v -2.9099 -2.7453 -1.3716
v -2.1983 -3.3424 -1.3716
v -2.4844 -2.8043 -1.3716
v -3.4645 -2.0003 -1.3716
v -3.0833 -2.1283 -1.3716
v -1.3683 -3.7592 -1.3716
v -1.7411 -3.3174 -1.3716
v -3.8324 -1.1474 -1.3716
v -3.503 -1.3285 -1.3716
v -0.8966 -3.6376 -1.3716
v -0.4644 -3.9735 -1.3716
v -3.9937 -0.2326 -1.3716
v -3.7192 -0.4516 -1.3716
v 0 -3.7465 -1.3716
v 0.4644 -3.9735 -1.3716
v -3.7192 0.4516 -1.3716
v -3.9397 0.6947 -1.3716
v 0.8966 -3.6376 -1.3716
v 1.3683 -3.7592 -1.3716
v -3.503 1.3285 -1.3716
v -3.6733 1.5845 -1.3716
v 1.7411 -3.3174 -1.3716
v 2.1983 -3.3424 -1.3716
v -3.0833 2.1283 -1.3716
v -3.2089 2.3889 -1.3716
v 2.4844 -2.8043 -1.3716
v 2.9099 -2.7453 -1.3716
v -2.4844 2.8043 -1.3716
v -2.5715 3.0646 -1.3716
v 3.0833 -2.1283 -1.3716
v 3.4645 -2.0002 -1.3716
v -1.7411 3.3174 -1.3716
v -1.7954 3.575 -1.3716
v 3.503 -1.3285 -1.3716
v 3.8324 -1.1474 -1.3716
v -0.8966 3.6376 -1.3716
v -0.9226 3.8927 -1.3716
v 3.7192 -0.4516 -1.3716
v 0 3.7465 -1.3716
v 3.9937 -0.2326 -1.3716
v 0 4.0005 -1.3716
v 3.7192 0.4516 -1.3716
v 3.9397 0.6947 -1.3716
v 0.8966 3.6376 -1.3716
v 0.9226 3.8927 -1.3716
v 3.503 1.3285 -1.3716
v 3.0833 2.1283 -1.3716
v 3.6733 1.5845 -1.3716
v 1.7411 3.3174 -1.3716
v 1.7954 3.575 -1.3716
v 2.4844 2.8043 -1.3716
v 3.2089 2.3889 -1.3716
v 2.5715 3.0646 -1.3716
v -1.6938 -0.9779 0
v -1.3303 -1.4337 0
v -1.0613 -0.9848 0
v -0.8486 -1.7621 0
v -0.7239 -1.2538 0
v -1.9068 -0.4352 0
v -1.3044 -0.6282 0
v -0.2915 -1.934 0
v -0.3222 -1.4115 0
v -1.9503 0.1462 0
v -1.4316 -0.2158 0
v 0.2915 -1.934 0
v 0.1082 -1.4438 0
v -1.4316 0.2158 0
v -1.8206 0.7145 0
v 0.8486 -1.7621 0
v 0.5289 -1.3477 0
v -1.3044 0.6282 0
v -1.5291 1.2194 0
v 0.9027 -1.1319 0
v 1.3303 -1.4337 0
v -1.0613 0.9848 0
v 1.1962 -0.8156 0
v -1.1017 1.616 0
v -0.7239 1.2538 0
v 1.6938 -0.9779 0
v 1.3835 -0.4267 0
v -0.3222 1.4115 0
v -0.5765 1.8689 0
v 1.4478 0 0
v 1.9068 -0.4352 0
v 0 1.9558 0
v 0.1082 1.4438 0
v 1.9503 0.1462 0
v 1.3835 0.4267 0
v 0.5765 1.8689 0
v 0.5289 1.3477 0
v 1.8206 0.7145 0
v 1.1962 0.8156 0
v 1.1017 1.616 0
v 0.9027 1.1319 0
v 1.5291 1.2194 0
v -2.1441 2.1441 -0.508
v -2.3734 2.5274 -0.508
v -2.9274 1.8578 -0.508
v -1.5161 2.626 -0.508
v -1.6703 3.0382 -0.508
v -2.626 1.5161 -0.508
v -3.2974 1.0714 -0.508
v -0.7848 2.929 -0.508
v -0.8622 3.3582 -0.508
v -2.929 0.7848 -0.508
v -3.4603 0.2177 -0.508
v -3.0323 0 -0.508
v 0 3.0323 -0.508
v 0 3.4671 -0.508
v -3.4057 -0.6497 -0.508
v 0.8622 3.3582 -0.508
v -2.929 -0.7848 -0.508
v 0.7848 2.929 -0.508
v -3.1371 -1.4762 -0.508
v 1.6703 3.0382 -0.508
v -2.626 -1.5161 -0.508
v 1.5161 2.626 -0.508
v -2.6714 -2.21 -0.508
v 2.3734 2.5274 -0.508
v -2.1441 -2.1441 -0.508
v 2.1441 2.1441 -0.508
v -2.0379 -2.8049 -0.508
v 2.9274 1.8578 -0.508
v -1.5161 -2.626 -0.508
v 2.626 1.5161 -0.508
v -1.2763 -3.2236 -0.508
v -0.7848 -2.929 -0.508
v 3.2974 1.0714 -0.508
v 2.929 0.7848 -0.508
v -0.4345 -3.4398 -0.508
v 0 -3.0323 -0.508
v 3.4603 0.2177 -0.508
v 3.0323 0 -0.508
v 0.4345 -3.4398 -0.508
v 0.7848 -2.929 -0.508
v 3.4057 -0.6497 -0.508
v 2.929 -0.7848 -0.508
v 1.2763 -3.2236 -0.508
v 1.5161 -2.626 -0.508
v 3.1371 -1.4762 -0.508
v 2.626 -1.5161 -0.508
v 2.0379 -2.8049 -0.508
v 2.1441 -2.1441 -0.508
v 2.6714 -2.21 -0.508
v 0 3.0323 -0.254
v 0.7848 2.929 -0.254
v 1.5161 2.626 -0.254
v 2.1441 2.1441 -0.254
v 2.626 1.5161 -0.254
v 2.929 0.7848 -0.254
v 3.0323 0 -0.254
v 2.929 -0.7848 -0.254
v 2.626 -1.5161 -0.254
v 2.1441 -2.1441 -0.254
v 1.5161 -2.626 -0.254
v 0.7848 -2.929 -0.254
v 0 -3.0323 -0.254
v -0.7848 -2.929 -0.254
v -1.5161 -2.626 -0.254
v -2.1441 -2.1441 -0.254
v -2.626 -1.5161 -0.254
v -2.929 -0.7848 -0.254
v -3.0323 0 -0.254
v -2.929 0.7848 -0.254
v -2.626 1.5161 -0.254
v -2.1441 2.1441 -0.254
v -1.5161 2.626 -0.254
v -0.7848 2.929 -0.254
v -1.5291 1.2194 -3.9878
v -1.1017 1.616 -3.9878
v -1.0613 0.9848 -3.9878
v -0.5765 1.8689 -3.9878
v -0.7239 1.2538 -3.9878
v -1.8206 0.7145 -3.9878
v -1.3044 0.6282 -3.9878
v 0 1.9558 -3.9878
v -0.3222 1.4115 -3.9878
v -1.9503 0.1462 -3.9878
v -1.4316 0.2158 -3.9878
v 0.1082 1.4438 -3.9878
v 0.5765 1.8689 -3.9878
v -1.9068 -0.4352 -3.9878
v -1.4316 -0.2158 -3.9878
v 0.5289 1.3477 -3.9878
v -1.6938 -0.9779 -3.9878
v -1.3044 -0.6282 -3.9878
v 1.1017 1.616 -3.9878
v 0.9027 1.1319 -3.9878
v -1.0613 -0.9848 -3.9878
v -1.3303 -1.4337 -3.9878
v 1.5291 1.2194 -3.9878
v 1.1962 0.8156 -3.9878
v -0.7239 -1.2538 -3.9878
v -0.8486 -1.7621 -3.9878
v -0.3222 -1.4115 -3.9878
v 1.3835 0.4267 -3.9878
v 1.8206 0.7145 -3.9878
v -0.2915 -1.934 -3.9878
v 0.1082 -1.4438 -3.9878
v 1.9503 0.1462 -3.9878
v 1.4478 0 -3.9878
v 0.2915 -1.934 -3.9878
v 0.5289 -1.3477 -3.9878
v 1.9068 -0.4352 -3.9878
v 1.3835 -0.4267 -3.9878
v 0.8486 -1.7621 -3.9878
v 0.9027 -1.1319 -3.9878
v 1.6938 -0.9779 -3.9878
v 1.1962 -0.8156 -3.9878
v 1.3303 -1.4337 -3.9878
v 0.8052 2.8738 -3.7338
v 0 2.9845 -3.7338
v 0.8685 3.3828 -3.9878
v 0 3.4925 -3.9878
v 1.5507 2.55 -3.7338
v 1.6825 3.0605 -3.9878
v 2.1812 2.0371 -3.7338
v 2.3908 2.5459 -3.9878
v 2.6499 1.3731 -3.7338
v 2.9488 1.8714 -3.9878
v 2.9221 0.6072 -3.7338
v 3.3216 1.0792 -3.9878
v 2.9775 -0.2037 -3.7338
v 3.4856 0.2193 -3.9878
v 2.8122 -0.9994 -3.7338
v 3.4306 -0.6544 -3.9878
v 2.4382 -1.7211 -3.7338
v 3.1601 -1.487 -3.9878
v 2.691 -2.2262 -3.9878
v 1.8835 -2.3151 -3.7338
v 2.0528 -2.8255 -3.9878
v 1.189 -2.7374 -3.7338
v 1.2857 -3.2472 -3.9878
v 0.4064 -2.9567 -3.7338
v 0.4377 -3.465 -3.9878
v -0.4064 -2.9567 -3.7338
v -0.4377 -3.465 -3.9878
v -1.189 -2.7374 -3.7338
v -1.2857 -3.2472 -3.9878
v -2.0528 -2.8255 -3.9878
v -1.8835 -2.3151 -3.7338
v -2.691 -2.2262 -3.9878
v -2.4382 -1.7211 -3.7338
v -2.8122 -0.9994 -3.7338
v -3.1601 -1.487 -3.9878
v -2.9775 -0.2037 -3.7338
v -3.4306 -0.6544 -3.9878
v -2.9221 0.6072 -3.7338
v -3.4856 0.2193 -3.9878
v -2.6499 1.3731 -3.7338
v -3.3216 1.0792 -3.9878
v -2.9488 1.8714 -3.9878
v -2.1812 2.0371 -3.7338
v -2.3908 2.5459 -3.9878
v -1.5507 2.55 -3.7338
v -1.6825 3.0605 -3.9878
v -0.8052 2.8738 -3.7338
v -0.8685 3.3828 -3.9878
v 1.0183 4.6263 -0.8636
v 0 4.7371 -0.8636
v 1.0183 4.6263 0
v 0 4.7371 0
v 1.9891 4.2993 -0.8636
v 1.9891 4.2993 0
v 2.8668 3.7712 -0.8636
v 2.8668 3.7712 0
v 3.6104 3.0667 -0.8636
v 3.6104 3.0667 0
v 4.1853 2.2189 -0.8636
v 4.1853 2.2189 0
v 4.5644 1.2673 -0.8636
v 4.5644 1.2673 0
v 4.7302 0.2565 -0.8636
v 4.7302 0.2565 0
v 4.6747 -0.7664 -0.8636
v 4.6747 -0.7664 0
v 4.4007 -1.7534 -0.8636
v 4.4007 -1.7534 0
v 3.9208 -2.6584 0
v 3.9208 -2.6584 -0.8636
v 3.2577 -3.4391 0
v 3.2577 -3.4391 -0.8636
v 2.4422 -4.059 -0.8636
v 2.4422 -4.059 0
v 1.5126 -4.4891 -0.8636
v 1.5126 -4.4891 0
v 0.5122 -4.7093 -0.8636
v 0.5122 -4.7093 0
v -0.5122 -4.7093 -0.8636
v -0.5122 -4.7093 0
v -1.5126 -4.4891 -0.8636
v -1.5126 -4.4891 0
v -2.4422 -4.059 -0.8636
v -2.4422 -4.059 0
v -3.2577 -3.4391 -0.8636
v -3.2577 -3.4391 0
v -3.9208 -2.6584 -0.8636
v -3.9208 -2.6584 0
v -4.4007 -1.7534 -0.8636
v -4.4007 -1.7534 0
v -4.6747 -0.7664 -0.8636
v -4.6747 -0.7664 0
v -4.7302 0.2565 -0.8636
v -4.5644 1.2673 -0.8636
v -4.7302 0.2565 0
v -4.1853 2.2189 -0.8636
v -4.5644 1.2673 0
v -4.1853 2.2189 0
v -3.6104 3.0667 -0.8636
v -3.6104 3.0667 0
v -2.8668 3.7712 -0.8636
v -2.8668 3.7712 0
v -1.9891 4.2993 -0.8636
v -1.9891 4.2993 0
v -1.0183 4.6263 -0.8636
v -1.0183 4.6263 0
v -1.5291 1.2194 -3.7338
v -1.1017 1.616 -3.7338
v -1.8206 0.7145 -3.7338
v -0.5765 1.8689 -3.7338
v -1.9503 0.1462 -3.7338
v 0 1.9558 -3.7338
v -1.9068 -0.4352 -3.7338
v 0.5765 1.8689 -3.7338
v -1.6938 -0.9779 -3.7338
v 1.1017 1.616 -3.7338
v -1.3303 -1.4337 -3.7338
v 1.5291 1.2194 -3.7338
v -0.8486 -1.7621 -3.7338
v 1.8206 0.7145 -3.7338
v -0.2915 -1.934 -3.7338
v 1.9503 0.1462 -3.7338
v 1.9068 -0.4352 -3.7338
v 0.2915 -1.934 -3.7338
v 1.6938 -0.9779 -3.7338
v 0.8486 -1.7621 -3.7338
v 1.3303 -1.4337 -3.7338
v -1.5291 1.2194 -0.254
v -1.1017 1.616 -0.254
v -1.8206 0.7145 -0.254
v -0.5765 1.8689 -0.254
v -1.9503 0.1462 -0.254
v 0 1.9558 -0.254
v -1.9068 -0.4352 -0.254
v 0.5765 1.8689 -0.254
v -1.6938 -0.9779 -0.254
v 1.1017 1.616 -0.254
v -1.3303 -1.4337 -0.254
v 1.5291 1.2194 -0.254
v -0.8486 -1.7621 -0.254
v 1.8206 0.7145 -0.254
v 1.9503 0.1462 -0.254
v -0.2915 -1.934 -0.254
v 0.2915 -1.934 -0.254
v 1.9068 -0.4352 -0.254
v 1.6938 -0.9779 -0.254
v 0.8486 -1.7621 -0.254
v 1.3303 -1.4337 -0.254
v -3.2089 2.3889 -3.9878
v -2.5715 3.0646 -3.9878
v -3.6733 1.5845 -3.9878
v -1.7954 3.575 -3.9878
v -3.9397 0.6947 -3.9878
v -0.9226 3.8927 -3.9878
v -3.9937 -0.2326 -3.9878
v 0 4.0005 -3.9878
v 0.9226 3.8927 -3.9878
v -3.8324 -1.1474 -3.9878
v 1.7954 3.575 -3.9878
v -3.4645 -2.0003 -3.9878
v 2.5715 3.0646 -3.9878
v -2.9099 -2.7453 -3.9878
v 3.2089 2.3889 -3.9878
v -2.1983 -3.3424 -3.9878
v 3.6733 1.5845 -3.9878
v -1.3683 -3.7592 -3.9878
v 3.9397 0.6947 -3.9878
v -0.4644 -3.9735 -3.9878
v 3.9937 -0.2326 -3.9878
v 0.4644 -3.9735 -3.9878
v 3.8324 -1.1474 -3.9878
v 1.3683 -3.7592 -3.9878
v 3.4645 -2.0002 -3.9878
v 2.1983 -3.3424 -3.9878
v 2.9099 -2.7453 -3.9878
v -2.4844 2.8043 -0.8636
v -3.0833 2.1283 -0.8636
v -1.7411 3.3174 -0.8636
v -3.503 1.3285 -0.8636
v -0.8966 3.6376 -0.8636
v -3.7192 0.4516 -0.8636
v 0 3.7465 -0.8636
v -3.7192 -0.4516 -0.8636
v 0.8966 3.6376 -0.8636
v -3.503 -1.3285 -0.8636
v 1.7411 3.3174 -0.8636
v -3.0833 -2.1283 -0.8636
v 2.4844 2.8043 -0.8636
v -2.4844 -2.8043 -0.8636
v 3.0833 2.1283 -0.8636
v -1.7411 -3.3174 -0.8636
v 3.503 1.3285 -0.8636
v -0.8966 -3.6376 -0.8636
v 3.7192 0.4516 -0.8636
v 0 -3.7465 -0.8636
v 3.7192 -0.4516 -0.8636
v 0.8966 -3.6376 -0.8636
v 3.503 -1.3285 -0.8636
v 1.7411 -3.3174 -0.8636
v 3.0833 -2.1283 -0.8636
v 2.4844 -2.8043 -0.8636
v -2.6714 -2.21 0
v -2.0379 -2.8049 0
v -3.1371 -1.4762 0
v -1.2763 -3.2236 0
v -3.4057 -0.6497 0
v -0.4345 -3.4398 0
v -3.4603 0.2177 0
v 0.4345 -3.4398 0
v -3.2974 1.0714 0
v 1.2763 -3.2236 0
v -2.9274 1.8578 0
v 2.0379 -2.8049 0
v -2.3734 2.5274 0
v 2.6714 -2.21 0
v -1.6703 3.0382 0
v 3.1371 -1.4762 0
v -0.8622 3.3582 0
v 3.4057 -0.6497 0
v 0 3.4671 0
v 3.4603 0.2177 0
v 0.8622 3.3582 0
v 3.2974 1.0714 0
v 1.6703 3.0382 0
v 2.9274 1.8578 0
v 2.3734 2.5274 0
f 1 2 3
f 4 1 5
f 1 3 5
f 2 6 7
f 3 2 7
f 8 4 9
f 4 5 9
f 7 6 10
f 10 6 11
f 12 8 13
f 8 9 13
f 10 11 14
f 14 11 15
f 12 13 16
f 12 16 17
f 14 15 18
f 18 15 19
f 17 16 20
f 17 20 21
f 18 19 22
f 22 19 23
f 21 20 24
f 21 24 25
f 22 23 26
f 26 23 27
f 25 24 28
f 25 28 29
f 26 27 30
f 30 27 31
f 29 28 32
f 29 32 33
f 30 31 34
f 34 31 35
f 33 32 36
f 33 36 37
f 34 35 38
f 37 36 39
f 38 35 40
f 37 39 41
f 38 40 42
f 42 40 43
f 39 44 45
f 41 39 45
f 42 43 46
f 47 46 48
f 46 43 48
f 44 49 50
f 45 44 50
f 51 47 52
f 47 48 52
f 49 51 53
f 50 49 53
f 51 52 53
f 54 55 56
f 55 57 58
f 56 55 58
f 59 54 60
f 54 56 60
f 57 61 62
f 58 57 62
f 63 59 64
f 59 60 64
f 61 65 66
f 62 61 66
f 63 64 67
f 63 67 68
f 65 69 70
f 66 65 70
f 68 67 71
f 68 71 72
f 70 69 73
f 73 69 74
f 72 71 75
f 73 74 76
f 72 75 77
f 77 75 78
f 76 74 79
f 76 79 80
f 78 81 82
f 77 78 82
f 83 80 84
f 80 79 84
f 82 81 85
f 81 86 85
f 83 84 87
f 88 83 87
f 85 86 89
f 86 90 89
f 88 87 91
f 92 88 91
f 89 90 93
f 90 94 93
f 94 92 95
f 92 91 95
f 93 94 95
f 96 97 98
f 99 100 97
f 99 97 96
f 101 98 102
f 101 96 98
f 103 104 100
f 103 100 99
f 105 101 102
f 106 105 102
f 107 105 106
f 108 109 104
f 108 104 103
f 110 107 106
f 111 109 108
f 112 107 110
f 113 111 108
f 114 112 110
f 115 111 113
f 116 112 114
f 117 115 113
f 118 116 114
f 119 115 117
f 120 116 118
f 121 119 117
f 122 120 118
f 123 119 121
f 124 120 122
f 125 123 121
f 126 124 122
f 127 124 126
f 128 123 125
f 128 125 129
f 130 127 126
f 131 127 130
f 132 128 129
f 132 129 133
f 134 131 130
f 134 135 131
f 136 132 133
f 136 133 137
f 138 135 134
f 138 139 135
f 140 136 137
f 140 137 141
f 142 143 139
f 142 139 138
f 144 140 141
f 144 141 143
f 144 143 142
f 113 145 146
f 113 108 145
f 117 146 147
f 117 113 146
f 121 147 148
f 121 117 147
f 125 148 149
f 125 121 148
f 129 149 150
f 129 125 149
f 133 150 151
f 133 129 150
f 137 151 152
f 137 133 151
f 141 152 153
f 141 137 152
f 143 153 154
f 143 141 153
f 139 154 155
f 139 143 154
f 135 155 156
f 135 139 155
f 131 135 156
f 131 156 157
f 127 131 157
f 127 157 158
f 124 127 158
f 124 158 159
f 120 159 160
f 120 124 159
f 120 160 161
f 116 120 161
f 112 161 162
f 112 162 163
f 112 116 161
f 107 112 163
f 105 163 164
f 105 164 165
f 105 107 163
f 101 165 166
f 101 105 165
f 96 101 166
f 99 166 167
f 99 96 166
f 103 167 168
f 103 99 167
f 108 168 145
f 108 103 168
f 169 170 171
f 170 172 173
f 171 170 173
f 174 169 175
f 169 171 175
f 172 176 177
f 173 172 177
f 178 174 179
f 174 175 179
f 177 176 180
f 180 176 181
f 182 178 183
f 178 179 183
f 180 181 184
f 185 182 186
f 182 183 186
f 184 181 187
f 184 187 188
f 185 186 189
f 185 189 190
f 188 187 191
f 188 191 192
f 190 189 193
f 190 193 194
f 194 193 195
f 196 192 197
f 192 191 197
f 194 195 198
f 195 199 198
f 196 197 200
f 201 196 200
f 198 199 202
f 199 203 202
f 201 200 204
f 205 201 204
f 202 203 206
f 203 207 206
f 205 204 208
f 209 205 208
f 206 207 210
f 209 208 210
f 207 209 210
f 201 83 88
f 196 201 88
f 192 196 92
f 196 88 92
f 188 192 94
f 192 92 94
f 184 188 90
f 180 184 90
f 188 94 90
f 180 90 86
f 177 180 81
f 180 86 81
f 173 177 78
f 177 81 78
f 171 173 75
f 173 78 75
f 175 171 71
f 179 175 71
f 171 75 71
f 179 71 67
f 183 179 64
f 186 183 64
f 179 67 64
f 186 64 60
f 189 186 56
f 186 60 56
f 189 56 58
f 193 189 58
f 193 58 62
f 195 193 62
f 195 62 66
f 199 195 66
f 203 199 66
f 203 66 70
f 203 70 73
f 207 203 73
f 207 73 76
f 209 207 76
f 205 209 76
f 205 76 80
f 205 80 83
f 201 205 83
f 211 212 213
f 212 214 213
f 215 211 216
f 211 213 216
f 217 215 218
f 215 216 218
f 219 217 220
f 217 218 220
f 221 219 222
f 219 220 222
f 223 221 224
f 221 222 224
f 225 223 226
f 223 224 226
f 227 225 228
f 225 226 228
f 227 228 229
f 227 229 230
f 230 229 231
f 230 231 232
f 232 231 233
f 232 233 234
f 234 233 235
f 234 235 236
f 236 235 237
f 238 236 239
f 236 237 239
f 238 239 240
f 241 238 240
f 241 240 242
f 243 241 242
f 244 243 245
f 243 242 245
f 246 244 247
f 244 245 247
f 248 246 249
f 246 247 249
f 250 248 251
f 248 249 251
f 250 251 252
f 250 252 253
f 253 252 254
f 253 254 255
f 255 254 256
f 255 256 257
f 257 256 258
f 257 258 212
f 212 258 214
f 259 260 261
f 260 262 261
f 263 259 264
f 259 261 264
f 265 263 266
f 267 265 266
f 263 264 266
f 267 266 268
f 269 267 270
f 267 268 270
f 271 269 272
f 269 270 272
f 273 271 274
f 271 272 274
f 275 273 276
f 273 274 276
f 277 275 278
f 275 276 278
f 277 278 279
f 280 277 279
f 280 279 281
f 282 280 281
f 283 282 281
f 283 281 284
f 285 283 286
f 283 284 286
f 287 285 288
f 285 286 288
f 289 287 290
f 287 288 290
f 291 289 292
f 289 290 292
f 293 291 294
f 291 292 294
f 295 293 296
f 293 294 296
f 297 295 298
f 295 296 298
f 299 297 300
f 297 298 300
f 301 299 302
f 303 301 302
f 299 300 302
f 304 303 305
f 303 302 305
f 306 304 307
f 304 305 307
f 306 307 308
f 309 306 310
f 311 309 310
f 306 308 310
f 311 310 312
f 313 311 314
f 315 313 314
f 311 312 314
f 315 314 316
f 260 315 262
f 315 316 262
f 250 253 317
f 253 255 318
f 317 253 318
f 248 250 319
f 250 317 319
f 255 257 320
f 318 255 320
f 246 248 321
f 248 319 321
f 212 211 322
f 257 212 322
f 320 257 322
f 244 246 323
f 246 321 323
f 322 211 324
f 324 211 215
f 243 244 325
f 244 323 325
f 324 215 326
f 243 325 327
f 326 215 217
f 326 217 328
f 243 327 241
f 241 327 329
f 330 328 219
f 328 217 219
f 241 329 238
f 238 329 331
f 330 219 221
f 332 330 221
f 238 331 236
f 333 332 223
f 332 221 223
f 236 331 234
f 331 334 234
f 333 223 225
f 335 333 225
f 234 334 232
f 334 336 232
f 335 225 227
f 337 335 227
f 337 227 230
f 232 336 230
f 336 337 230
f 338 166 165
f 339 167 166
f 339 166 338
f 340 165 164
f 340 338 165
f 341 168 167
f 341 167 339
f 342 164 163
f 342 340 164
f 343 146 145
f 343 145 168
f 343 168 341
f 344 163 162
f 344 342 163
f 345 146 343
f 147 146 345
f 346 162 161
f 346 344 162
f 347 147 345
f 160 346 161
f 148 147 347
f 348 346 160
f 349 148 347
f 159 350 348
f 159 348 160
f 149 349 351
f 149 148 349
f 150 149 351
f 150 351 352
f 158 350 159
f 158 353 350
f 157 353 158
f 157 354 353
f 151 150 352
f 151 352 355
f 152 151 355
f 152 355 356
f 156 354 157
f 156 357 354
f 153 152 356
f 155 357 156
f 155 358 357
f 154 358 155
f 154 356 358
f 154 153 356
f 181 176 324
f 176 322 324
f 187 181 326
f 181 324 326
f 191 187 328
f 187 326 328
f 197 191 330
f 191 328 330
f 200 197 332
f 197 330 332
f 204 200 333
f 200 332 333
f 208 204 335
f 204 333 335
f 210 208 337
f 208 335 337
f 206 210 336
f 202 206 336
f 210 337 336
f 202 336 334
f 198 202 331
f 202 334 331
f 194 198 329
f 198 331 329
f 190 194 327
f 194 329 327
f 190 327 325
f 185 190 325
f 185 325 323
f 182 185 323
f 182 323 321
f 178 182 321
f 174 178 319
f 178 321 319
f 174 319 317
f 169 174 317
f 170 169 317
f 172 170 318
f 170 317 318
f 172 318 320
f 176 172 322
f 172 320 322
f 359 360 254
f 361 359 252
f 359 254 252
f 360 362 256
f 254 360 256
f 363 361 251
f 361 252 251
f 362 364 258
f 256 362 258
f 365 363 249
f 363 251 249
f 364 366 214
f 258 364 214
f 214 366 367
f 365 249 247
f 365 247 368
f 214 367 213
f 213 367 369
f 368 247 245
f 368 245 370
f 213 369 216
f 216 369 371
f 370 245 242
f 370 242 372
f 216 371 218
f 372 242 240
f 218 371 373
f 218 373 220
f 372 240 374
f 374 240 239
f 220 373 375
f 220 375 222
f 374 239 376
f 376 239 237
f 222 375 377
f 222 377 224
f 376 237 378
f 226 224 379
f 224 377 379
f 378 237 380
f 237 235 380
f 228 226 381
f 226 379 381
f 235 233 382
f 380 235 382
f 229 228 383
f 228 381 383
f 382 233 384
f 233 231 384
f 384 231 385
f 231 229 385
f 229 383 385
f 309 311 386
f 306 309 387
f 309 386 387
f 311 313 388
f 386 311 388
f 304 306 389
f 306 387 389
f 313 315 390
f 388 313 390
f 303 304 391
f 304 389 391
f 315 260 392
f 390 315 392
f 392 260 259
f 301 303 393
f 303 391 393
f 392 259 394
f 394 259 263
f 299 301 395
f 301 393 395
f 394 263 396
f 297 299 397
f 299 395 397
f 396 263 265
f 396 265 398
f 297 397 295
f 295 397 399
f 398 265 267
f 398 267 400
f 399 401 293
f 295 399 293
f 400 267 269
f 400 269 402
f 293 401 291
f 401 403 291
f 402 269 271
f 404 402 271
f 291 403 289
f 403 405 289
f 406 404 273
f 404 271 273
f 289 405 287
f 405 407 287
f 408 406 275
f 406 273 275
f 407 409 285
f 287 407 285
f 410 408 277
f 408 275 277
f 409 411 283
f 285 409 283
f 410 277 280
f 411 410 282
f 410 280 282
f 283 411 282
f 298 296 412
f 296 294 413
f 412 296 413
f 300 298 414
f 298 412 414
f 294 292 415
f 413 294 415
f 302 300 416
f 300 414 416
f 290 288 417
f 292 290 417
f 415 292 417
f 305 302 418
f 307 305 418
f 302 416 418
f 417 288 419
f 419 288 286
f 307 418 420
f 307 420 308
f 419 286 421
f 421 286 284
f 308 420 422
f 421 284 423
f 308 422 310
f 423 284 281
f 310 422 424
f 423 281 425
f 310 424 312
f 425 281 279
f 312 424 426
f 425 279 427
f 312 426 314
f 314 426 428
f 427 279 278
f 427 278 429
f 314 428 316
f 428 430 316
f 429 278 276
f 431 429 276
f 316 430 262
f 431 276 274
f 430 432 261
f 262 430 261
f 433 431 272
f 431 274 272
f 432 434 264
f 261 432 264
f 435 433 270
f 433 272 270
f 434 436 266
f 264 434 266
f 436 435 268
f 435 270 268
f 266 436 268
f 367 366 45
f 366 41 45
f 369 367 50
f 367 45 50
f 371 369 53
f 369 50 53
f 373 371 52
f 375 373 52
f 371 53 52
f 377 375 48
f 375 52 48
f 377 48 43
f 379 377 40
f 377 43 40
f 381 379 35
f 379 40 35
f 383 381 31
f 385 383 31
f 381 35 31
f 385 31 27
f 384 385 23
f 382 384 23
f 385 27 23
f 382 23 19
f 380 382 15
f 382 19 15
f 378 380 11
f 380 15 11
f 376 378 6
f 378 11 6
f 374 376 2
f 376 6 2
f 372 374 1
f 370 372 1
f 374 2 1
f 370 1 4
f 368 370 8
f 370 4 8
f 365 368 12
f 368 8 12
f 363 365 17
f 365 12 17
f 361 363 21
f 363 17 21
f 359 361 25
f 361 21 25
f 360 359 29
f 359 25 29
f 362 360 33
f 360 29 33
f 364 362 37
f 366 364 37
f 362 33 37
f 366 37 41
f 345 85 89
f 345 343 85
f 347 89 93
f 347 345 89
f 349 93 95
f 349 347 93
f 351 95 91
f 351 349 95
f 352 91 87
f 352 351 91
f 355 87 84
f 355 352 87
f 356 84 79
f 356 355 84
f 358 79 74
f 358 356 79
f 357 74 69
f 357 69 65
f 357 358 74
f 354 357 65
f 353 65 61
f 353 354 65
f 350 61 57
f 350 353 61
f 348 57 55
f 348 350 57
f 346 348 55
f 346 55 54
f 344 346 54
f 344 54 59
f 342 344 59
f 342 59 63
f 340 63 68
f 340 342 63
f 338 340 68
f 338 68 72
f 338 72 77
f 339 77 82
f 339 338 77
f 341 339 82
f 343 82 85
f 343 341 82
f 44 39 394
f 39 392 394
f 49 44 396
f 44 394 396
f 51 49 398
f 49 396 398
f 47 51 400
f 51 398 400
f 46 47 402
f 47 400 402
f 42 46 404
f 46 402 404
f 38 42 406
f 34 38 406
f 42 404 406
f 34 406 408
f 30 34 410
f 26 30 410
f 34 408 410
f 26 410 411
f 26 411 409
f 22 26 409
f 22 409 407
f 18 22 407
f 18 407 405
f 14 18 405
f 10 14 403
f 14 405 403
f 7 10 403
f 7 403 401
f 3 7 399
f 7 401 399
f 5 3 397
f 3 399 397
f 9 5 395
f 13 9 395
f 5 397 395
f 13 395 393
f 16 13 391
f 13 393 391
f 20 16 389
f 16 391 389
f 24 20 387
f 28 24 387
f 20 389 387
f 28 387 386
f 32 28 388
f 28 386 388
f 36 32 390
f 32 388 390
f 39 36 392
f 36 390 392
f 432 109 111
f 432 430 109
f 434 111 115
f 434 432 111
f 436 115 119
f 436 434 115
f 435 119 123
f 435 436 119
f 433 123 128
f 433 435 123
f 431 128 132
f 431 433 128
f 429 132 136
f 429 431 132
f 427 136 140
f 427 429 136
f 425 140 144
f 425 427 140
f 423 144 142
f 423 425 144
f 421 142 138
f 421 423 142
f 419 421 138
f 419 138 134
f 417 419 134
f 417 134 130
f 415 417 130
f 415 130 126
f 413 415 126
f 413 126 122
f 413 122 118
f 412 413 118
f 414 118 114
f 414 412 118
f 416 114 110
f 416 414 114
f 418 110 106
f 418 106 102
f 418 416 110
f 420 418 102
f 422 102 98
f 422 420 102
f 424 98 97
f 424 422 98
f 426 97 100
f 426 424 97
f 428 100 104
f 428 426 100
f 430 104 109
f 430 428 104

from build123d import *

# Parameters (mm, degrees)
SKETCH2_R      = 1.4478
EXTRUDE1_DEPTH = 4.9878


with BuildPart() as part:
    # Sketch1 → Revolve1 (revolve)
    with BuildSketch(Plane(origin=(0, 0, 0), x_dir=(0, 0, -1), z_dir=(1, 0, 0))):
        Polygon((0, 4.7371), (0, 0), (3.9878, 0), (3.9878, 4.0005), (1.3716, 4.0005), (1.3716, 3.7465), (0.8636, 3.7465), (0.8636, 4.7371), align=None)
    revolve(axis=Axis((0, 0, 0), (0, 0, -1)))

    # Sketch2 → Extrude1 (cut, through all)
    with BuildSketch(Plane.XY):
        Circle(SKETCH2_R)
    extrude(amount=-EXTRUDE1_DEPTH, mode=Mode.SUBTRACT)

    # Sketch3 → Cut-Revolve1 (revolve, cut)
    with BuildSketch(Plane(origin=(0, 0, 0), x_dir=(0, 0, -1), z_dir=(1, 0, 0))):
        Polygon((3.9878, 1.9558), (3.7338, 1.9558), (3.7338, 2.9845), (3.9878, 3.4925), align=None)
        Polygon((0, 1.9558), (0.254, 1.9558), (0.254, 3.032275316), (0.508, 3.032275316), (0.508, 3.4671), (0, 3.4671), align=None)
    revolve(axis=Axis((0, 0, 0), (0, 0, -1)), mode=Mode.SUBTRACT)


solid = part.part
